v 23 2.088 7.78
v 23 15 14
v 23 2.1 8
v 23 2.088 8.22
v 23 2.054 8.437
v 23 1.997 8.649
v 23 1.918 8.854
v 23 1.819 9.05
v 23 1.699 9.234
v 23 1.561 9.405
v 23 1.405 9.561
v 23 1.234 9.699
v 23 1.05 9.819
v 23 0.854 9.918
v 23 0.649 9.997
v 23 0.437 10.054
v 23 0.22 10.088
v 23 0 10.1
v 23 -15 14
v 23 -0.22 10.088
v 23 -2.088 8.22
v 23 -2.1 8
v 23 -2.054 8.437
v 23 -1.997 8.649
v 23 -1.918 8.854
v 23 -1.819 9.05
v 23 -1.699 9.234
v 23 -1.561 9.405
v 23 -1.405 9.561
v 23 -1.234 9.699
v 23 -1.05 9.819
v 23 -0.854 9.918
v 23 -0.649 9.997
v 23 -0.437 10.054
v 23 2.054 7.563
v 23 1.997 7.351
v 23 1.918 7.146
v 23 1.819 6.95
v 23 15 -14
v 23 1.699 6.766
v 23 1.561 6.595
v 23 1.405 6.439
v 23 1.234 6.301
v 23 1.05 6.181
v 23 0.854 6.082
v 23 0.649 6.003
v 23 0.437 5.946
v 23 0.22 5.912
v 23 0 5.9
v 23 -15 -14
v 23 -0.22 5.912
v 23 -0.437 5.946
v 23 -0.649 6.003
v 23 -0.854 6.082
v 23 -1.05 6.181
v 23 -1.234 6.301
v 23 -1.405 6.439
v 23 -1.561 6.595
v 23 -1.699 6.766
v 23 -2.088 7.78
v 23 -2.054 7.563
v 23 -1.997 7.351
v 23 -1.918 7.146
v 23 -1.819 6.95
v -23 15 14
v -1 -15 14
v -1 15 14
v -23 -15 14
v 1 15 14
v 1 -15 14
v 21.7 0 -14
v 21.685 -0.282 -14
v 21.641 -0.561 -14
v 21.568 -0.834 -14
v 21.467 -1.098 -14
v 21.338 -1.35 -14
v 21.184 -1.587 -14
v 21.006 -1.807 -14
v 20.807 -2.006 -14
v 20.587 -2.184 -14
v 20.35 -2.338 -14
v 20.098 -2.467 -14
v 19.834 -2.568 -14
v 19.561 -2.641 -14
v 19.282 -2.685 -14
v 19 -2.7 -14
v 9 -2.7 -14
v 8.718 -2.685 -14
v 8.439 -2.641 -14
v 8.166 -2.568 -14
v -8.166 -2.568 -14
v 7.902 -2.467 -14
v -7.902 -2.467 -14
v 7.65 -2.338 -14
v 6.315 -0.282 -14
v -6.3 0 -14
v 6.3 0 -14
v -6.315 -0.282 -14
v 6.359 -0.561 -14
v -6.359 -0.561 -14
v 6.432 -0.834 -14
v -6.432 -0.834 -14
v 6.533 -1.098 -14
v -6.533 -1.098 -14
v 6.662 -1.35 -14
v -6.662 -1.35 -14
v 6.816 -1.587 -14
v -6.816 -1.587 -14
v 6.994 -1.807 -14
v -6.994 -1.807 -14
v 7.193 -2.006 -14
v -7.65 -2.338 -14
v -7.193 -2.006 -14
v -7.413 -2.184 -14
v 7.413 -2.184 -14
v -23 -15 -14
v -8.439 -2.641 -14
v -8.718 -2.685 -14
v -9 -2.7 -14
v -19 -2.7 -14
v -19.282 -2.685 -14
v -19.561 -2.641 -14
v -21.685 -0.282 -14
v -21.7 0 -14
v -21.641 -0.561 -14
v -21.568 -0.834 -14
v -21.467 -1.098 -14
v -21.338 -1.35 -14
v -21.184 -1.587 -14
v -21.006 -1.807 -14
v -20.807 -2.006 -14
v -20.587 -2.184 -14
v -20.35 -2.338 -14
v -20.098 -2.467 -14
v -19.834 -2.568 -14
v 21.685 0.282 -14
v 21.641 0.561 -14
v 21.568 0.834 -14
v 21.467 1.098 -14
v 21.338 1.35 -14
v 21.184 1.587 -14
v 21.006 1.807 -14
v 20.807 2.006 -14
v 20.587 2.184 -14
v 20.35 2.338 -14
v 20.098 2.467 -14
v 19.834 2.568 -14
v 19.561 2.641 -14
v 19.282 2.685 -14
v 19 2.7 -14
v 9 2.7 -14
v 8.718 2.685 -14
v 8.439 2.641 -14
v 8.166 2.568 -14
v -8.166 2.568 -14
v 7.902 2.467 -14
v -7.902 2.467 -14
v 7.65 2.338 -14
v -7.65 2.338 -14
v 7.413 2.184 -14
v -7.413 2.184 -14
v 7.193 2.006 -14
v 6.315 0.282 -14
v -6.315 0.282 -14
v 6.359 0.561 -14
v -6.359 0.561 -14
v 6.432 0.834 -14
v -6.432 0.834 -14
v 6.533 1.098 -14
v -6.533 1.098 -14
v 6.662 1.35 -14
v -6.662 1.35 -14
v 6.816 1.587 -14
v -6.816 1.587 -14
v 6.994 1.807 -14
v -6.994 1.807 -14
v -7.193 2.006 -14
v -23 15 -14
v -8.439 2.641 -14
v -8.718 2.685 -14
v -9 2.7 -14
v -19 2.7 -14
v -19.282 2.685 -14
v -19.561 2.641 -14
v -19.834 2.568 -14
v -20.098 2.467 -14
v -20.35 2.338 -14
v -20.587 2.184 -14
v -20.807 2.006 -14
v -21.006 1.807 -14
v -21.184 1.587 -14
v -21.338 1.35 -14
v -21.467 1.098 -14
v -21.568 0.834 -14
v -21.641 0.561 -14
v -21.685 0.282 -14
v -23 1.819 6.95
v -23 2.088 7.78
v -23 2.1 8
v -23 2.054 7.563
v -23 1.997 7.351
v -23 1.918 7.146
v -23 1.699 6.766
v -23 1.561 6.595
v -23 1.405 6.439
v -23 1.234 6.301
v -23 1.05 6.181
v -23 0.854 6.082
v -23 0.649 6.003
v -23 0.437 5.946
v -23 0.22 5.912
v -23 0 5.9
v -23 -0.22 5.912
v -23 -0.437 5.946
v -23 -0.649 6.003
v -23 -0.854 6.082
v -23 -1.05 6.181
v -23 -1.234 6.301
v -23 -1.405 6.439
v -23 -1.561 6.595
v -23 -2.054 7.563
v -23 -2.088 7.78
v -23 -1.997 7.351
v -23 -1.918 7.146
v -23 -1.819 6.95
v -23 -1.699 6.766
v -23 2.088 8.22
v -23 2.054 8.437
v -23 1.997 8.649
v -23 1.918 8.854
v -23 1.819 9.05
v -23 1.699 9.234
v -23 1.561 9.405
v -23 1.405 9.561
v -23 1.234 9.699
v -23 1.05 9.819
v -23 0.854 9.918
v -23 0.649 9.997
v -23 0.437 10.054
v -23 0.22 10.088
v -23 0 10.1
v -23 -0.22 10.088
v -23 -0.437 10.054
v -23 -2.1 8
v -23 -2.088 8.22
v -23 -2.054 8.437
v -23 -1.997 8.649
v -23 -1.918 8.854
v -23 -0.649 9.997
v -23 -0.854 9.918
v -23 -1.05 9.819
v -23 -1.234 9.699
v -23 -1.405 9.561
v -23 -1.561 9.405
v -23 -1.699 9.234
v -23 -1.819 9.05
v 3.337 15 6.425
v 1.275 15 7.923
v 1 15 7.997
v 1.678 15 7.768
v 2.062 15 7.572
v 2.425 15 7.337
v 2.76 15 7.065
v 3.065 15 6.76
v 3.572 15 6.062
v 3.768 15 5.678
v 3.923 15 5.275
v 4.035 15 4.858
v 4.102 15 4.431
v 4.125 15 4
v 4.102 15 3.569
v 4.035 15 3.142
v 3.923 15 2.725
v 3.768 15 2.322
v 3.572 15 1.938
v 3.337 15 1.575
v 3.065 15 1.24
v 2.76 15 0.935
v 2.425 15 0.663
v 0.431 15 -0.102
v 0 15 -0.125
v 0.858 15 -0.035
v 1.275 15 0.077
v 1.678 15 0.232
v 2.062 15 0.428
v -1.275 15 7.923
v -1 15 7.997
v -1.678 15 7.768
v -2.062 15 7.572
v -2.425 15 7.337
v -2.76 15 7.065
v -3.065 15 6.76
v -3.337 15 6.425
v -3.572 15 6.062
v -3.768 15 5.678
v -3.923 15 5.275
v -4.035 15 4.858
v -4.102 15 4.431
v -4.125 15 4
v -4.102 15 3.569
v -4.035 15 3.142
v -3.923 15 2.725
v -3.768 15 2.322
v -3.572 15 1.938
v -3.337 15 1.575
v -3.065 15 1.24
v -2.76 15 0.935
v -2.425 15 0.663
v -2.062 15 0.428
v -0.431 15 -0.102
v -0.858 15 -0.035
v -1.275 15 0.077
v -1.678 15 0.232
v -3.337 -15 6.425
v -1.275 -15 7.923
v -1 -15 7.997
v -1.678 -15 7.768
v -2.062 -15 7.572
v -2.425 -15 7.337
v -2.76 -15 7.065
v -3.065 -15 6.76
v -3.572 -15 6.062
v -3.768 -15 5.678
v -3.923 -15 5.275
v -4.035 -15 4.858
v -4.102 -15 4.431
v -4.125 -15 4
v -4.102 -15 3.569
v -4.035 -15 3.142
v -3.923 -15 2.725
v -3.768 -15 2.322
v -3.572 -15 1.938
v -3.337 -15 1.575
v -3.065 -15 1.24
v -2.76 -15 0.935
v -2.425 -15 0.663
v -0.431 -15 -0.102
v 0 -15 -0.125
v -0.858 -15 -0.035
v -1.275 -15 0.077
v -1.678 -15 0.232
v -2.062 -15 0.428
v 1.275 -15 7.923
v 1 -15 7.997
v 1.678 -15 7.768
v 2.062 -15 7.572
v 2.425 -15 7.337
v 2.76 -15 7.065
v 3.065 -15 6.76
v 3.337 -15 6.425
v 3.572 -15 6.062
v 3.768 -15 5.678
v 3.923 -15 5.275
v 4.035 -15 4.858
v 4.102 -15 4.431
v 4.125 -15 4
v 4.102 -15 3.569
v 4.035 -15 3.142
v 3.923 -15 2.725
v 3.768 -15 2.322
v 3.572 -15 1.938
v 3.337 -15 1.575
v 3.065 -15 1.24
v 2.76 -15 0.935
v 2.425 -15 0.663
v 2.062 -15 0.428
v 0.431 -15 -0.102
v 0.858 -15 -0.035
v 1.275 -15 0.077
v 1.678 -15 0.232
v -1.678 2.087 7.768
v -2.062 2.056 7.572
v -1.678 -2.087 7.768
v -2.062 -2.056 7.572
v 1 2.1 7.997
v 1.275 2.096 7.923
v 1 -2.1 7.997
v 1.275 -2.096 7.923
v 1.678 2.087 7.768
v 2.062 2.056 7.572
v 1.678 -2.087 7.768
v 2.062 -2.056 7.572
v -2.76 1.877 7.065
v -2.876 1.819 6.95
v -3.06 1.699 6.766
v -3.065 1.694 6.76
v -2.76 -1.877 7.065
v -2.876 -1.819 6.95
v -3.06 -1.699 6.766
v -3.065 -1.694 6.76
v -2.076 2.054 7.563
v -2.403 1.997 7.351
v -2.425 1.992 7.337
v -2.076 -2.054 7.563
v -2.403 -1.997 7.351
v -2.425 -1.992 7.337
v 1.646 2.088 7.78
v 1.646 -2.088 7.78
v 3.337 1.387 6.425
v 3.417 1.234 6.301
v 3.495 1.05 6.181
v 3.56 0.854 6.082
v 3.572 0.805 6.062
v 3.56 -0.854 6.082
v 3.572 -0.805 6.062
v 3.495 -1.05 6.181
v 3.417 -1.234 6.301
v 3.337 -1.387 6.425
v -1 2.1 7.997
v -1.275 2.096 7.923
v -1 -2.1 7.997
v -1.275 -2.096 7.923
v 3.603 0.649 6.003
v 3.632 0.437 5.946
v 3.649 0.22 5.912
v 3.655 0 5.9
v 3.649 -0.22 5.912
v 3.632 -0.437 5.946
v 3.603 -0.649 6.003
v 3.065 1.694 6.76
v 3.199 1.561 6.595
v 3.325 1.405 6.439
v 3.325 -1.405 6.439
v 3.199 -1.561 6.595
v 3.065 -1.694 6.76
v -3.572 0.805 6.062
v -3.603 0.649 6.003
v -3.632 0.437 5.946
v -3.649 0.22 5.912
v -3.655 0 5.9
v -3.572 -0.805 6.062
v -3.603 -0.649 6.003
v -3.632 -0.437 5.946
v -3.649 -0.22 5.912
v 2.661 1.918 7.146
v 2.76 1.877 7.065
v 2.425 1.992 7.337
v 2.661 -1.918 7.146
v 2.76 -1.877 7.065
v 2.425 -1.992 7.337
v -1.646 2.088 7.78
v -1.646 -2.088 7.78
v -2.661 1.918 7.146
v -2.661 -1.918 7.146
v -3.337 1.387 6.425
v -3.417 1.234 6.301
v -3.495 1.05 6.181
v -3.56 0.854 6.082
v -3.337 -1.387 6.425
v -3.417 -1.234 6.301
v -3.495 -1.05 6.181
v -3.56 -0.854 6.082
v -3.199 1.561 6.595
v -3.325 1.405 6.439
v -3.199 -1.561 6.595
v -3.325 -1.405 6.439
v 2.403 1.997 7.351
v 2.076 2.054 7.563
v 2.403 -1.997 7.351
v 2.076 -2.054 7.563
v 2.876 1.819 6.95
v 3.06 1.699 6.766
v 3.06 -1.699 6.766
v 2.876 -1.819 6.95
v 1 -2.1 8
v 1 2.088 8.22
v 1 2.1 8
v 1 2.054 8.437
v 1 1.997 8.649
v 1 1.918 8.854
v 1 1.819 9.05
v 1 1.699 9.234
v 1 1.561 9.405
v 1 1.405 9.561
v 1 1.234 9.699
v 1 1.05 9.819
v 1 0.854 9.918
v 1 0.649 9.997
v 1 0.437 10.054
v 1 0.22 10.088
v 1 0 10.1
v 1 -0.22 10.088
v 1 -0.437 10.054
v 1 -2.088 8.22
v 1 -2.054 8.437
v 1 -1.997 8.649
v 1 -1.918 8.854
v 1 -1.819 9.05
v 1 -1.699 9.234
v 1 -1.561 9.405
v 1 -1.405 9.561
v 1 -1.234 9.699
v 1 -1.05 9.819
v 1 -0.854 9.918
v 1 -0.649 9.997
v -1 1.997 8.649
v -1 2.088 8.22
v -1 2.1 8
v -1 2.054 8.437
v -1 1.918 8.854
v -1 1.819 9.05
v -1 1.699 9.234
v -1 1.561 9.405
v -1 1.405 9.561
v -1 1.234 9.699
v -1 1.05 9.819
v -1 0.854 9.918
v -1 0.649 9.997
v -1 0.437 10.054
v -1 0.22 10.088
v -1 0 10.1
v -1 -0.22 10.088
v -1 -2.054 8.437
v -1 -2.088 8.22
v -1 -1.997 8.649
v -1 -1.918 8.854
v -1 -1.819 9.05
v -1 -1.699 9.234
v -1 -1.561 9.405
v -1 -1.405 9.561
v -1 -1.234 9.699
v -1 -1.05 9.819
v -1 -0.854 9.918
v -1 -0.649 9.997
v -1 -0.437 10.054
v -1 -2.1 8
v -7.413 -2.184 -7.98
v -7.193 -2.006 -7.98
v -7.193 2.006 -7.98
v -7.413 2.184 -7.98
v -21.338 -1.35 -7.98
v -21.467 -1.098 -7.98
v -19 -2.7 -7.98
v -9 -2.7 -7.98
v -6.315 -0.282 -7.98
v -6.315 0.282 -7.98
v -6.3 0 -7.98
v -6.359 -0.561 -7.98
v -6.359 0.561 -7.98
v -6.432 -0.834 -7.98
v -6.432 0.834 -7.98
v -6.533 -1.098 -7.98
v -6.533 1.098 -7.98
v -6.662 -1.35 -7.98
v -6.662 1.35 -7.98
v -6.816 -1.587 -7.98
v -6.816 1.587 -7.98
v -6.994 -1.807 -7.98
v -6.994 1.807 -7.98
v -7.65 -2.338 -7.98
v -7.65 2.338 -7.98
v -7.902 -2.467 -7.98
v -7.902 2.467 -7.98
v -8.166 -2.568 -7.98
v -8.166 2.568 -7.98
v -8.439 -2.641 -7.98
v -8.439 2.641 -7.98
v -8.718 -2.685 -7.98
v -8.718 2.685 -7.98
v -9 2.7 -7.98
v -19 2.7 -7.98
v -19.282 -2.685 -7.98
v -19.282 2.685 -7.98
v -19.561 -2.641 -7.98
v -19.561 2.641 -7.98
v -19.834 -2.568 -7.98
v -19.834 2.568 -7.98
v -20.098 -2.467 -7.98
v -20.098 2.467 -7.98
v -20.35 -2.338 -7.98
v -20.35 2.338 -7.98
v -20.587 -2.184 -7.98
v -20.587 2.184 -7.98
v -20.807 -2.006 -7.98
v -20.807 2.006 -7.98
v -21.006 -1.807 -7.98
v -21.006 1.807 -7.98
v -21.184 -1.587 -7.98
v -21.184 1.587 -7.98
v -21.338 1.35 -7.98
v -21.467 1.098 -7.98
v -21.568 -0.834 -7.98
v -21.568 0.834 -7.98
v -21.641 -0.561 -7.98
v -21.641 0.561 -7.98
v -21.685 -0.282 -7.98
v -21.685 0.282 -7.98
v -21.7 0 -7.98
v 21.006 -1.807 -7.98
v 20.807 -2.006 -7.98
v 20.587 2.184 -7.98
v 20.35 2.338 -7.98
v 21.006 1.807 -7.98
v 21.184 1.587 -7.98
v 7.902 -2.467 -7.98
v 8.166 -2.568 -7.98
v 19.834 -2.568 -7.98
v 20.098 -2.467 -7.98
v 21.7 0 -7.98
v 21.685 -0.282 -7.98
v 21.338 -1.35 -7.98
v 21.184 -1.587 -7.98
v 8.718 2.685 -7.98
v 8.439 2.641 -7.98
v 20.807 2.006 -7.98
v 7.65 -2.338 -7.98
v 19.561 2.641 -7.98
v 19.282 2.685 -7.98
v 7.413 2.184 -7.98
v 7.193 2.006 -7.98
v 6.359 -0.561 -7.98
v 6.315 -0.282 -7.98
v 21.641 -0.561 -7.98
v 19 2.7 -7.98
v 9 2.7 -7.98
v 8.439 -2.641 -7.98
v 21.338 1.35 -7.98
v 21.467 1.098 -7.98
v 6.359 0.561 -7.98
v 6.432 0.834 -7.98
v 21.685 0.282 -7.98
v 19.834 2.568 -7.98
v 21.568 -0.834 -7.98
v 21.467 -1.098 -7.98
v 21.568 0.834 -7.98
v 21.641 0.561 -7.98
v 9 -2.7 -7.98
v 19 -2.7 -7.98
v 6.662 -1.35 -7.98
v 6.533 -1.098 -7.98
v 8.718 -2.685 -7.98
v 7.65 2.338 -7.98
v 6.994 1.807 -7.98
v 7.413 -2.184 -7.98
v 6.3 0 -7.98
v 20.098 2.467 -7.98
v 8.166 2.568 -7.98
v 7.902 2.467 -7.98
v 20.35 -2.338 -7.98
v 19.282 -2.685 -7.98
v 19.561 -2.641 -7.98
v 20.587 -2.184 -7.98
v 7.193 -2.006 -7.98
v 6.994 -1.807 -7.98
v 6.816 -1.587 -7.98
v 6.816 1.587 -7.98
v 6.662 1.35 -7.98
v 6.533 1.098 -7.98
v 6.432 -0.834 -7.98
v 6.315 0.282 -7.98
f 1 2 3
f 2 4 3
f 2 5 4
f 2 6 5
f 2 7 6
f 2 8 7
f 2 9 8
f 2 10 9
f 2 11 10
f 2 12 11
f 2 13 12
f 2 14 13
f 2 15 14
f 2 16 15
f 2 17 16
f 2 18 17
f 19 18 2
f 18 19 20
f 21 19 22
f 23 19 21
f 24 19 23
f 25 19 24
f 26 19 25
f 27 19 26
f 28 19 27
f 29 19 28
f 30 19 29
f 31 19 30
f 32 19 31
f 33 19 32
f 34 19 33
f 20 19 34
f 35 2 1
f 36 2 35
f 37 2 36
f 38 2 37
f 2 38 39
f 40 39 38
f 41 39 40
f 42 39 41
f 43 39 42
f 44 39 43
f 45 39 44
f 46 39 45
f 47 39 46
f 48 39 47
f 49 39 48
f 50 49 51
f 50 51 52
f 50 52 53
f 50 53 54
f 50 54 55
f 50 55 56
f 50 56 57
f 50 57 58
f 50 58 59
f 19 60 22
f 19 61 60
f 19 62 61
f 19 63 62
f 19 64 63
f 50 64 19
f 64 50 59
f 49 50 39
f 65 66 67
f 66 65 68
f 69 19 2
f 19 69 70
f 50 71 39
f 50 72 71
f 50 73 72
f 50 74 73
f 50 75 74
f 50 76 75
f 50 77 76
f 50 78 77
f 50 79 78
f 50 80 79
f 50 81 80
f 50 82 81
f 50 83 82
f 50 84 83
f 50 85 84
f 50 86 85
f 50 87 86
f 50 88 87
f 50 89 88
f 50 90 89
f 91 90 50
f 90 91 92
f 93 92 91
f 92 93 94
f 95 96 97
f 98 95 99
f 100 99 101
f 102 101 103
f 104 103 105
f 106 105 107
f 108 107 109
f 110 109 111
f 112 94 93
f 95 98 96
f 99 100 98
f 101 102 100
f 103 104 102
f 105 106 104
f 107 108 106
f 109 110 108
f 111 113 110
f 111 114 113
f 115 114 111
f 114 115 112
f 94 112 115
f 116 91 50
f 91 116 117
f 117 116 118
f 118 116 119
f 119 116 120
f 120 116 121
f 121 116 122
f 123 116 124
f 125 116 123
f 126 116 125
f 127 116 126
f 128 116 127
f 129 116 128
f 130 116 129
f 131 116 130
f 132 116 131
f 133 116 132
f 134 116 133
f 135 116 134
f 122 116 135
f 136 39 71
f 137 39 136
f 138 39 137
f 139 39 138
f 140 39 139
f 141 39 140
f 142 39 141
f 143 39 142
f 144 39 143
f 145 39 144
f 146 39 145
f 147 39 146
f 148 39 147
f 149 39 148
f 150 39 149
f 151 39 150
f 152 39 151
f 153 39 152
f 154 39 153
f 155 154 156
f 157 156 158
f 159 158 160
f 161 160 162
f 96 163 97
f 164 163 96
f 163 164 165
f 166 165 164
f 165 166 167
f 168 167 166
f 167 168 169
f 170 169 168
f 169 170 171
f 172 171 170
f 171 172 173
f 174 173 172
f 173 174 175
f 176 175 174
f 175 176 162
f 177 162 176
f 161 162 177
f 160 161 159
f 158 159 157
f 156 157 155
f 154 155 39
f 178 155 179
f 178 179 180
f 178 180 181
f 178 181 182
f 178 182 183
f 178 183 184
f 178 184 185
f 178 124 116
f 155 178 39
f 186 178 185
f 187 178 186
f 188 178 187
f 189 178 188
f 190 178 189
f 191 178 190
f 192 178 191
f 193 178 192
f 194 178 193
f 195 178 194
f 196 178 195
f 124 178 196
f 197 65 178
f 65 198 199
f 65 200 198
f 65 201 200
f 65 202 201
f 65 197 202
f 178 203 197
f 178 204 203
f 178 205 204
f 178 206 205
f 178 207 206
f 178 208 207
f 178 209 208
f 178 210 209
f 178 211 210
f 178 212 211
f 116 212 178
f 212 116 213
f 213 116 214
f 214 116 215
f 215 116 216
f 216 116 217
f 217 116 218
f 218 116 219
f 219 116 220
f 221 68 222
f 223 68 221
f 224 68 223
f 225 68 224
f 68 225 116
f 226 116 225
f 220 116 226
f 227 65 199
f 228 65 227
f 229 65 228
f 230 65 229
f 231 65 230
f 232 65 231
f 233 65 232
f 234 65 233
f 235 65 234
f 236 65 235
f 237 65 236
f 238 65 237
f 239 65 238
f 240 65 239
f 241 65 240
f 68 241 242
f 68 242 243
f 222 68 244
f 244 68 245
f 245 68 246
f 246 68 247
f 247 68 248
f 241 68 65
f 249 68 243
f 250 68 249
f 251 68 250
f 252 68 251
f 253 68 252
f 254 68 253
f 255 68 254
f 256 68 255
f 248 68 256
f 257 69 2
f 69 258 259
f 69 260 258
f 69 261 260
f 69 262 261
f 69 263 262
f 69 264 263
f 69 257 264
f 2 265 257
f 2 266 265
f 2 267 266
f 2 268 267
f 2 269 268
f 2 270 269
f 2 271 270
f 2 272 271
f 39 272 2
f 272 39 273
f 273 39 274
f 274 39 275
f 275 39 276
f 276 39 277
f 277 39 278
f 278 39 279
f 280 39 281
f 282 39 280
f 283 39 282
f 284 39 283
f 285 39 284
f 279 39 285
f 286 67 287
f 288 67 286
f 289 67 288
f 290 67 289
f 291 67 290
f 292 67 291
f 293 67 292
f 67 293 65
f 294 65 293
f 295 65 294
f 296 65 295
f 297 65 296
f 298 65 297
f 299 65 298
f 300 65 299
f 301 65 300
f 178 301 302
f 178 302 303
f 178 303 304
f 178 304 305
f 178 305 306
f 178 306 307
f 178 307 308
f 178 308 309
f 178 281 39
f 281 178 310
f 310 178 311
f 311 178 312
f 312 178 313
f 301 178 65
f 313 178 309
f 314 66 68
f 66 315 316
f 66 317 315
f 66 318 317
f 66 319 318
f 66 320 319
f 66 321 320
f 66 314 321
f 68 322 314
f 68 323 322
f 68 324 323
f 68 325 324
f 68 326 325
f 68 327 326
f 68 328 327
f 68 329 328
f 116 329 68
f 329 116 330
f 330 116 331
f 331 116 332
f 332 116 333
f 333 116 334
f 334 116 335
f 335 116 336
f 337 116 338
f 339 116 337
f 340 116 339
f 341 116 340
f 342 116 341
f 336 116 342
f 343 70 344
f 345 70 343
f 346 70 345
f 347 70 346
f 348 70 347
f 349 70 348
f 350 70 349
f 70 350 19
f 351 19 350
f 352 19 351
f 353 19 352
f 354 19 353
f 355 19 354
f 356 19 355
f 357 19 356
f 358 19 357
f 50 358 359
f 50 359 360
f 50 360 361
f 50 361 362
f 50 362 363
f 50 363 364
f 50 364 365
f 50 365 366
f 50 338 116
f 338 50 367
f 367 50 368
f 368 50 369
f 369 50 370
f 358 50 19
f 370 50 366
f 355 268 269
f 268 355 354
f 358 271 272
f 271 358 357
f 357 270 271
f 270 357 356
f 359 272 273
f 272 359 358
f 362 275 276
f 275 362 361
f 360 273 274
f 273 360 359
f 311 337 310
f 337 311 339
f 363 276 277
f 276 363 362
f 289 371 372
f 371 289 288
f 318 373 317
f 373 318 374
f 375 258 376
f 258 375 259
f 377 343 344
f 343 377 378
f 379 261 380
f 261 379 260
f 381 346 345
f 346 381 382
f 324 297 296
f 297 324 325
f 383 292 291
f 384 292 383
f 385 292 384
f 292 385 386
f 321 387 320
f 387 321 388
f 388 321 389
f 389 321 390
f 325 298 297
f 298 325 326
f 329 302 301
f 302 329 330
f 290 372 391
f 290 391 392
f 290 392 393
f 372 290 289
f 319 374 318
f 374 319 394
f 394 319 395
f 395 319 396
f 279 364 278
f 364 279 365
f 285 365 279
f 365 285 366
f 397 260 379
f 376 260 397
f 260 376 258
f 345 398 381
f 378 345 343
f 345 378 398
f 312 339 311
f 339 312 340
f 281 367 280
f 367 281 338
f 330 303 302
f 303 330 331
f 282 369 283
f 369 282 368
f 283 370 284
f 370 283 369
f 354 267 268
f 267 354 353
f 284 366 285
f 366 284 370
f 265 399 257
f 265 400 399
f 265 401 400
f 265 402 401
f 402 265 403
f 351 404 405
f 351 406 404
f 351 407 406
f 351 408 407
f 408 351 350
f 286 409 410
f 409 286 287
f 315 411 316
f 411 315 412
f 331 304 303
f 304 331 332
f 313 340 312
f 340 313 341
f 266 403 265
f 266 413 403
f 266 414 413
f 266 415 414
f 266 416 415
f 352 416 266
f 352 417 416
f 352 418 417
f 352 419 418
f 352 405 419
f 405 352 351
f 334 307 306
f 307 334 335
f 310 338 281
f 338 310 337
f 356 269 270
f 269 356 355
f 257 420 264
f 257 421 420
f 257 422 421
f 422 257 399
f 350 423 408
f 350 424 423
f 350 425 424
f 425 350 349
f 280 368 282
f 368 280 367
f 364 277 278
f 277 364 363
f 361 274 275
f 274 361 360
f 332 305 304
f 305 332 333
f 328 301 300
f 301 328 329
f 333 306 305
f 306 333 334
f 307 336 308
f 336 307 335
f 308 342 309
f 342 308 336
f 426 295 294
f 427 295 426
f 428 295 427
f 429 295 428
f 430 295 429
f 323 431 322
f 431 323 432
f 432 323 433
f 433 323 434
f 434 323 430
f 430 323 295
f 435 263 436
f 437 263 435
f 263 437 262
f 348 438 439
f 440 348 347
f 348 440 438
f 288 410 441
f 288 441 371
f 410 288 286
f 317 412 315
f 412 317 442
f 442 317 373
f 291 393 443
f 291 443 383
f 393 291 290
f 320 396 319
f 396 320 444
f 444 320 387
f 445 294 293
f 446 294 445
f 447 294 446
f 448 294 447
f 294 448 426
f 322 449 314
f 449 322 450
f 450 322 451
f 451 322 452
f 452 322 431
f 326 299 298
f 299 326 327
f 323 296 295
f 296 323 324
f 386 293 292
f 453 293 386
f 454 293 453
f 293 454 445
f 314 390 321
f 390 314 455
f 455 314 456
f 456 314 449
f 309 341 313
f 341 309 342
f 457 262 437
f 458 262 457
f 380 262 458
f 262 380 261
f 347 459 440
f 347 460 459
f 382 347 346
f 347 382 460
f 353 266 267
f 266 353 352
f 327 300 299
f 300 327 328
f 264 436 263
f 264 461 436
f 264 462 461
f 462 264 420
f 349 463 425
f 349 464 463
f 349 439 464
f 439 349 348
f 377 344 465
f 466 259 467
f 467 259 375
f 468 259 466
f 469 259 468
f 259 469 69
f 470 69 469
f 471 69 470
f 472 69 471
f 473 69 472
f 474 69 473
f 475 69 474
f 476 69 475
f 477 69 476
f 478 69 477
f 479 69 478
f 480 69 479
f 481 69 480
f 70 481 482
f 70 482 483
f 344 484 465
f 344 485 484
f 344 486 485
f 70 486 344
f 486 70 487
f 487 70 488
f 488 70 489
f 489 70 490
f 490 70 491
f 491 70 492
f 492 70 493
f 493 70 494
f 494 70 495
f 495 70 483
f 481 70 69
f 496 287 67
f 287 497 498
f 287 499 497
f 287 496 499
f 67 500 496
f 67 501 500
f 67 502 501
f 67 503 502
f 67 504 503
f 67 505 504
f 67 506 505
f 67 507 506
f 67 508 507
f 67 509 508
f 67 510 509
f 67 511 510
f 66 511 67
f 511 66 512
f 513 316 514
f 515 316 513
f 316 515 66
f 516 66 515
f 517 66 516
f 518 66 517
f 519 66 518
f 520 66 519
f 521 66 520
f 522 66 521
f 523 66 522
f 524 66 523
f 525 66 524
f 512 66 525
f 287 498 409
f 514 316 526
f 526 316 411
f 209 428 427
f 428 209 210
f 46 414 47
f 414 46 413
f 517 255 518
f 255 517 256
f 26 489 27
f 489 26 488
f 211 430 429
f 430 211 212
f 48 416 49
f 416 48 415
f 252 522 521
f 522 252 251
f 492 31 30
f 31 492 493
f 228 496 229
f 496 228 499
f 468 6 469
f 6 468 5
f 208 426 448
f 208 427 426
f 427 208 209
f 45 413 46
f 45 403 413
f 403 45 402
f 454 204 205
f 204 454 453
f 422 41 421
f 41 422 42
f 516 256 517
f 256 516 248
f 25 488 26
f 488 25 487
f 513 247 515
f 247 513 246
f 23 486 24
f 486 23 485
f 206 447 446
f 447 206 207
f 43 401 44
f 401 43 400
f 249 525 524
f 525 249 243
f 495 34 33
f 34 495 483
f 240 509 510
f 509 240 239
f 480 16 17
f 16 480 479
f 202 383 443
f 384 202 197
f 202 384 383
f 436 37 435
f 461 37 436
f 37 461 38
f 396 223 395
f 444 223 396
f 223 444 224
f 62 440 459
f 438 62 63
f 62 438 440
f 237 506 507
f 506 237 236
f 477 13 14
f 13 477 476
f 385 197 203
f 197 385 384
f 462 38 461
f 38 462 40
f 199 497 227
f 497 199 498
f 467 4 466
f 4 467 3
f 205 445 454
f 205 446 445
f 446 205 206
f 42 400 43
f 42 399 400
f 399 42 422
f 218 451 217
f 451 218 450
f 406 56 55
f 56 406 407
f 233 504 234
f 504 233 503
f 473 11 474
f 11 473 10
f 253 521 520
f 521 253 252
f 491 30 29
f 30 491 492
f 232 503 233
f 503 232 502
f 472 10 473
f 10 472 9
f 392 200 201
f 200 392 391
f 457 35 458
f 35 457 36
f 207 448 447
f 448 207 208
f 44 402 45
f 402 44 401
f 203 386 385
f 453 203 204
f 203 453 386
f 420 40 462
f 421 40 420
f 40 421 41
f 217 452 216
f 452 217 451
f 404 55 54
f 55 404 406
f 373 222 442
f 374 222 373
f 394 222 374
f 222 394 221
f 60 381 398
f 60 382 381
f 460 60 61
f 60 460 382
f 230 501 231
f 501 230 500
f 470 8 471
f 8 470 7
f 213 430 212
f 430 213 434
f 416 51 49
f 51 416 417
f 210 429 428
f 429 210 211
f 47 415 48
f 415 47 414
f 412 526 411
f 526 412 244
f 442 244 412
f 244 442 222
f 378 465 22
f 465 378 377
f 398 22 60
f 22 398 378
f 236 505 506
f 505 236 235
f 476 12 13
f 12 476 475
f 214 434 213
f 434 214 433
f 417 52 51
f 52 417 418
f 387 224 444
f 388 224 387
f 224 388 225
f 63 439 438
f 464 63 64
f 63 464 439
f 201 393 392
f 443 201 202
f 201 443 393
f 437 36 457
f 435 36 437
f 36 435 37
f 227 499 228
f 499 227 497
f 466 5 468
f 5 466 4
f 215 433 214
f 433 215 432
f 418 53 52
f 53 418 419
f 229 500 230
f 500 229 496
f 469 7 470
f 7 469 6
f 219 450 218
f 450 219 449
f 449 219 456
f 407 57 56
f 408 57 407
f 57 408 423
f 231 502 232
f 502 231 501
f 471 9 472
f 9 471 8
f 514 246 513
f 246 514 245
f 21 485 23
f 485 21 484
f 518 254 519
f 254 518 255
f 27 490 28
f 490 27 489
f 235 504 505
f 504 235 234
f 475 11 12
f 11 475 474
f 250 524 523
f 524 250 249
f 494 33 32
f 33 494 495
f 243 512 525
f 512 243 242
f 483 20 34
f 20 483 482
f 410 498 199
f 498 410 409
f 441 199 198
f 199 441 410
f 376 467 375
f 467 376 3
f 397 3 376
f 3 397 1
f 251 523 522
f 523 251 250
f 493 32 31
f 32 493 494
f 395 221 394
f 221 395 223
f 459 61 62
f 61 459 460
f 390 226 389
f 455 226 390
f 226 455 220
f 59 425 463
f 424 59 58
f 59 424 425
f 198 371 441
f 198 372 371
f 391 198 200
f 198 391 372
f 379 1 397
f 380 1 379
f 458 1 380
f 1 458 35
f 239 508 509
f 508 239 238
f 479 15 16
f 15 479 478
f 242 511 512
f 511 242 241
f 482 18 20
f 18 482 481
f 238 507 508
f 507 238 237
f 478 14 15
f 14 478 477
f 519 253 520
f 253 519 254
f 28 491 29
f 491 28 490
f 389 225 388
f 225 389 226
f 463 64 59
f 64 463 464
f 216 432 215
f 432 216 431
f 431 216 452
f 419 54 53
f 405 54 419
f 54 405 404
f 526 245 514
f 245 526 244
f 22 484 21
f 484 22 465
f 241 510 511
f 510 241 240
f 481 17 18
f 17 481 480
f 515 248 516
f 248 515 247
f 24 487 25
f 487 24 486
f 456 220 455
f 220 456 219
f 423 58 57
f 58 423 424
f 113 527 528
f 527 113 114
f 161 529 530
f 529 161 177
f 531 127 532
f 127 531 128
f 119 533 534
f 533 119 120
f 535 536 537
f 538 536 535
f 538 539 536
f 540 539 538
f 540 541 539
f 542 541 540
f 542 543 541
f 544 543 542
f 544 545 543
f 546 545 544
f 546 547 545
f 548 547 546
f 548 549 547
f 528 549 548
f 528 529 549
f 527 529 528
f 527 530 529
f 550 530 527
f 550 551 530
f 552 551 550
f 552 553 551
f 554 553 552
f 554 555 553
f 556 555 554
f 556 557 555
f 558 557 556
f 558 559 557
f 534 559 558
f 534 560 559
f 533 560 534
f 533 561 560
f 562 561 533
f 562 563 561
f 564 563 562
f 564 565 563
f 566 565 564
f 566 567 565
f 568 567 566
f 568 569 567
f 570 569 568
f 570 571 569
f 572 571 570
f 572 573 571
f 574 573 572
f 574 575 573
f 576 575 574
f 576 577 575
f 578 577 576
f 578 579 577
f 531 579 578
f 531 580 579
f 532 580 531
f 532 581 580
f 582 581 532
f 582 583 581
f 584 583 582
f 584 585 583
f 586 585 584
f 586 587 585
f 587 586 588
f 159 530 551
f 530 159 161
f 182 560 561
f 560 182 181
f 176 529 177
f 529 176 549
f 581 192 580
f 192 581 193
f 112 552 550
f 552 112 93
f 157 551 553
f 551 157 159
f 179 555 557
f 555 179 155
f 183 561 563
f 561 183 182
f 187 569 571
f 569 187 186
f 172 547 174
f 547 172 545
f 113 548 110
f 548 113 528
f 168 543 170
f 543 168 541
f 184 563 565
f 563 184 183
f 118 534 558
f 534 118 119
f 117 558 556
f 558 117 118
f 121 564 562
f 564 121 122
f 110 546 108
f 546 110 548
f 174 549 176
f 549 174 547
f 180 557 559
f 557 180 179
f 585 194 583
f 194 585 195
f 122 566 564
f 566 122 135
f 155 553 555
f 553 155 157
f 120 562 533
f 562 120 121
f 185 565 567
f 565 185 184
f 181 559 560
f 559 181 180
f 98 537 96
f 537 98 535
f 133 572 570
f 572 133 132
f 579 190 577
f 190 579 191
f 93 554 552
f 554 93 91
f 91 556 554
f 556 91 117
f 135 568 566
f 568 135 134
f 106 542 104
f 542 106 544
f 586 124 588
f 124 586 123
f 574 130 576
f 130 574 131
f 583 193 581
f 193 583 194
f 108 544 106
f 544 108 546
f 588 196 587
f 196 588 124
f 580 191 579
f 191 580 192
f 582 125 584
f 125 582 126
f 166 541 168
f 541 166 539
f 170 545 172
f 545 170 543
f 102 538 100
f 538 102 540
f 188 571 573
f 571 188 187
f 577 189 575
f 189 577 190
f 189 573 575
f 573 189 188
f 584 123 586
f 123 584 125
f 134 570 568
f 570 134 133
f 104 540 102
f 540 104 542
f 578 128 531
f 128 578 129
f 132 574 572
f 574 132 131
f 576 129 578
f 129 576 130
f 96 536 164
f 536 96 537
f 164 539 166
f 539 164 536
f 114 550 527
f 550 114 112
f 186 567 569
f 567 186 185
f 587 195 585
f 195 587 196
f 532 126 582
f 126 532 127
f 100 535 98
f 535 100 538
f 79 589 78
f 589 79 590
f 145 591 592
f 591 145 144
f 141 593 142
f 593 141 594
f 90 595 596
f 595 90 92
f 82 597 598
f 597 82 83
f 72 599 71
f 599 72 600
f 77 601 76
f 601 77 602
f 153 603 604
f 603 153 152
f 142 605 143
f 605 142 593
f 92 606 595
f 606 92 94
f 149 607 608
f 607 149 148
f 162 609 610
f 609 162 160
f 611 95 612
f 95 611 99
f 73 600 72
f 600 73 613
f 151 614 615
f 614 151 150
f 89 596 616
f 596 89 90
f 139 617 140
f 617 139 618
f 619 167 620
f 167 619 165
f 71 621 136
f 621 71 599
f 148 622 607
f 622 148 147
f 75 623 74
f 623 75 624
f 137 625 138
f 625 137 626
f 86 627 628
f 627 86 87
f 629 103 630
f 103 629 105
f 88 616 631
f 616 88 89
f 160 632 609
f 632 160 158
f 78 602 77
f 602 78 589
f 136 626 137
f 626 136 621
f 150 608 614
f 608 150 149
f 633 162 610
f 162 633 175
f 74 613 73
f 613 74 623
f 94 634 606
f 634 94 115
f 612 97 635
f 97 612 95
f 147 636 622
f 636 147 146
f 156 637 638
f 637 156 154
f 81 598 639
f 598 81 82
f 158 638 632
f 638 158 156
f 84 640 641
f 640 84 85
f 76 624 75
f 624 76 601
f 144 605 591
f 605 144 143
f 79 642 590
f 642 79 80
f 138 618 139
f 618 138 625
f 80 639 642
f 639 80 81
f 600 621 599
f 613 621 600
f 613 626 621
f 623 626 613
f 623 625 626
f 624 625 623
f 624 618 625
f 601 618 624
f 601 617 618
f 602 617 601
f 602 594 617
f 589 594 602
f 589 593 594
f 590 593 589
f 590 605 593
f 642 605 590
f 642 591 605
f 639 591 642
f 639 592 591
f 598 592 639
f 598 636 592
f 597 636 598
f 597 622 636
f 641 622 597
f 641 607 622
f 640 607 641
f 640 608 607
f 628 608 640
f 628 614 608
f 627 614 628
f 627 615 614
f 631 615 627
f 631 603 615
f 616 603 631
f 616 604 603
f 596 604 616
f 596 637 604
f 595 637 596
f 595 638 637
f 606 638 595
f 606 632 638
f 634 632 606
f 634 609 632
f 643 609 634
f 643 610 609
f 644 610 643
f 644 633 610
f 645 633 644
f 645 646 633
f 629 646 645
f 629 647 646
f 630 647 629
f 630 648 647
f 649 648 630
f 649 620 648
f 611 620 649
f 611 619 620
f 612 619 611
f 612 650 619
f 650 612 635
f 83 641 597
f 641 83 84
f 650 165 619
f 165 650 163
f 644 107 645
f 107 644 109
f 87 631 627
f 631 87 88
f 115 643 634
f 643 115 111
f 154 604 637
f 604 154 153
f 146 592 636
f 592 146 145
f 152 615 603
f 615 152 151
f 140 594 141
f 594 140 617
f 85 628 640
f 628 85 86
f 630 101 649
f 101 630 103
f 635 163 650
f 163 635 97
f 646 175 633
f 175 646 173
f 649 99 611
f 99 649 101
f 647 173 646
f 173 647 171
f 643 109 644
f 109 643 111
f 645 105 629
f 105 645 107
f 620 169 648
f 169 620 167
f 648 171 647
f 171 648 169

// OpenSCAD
// 8 mm shaft pedestal: clamp pedestal for a horizontal precision shaft.
$fn = 60;
eps = 0.02;
shaft_d = 8;
body_l = 46;
body_d = 30;
body_h = 28;
base_t = 6;
slot_w = 2;
clamp_screw_d = 4.2;
mount_d = 5.4;

module mount_slot(x) {
    hull() {
        translate([x - 5, 0, -body_h / 2 - eps]) cylinder(d = mount_d, h = base_t + 2 * eps);
        translate([x + 5, 0, -body_h / 2 - eps]) cylinder(d = mount_d, h = base_t + 2 * eps);
    }
}

difference() {
    cube([body_l, body_d, body_h], center = true);
    translate([0, -body_d / 2 - eps, 4])
        rotate([-90, 0, 0]) cylinder(d = shaft_d + 0.25, h = body_d + 2 * eps);
    // A top slit allows the M4 screw to close the shaft bore.
    translate([-slot_w / 2, -body_d / 2 - eps, 4]) cube([slot_w, body_d + 2 * eps, body_h / 2 + eps]);
    translate([-body_l / 2 - eps, 0, body_h / 2 - 6])
        rotate([0, 90, 0]) cylinder(d = clamp_screw_d, h = body_l + 2 * eps);
    mount_slot(-14);
    mount_slot(14);
}
